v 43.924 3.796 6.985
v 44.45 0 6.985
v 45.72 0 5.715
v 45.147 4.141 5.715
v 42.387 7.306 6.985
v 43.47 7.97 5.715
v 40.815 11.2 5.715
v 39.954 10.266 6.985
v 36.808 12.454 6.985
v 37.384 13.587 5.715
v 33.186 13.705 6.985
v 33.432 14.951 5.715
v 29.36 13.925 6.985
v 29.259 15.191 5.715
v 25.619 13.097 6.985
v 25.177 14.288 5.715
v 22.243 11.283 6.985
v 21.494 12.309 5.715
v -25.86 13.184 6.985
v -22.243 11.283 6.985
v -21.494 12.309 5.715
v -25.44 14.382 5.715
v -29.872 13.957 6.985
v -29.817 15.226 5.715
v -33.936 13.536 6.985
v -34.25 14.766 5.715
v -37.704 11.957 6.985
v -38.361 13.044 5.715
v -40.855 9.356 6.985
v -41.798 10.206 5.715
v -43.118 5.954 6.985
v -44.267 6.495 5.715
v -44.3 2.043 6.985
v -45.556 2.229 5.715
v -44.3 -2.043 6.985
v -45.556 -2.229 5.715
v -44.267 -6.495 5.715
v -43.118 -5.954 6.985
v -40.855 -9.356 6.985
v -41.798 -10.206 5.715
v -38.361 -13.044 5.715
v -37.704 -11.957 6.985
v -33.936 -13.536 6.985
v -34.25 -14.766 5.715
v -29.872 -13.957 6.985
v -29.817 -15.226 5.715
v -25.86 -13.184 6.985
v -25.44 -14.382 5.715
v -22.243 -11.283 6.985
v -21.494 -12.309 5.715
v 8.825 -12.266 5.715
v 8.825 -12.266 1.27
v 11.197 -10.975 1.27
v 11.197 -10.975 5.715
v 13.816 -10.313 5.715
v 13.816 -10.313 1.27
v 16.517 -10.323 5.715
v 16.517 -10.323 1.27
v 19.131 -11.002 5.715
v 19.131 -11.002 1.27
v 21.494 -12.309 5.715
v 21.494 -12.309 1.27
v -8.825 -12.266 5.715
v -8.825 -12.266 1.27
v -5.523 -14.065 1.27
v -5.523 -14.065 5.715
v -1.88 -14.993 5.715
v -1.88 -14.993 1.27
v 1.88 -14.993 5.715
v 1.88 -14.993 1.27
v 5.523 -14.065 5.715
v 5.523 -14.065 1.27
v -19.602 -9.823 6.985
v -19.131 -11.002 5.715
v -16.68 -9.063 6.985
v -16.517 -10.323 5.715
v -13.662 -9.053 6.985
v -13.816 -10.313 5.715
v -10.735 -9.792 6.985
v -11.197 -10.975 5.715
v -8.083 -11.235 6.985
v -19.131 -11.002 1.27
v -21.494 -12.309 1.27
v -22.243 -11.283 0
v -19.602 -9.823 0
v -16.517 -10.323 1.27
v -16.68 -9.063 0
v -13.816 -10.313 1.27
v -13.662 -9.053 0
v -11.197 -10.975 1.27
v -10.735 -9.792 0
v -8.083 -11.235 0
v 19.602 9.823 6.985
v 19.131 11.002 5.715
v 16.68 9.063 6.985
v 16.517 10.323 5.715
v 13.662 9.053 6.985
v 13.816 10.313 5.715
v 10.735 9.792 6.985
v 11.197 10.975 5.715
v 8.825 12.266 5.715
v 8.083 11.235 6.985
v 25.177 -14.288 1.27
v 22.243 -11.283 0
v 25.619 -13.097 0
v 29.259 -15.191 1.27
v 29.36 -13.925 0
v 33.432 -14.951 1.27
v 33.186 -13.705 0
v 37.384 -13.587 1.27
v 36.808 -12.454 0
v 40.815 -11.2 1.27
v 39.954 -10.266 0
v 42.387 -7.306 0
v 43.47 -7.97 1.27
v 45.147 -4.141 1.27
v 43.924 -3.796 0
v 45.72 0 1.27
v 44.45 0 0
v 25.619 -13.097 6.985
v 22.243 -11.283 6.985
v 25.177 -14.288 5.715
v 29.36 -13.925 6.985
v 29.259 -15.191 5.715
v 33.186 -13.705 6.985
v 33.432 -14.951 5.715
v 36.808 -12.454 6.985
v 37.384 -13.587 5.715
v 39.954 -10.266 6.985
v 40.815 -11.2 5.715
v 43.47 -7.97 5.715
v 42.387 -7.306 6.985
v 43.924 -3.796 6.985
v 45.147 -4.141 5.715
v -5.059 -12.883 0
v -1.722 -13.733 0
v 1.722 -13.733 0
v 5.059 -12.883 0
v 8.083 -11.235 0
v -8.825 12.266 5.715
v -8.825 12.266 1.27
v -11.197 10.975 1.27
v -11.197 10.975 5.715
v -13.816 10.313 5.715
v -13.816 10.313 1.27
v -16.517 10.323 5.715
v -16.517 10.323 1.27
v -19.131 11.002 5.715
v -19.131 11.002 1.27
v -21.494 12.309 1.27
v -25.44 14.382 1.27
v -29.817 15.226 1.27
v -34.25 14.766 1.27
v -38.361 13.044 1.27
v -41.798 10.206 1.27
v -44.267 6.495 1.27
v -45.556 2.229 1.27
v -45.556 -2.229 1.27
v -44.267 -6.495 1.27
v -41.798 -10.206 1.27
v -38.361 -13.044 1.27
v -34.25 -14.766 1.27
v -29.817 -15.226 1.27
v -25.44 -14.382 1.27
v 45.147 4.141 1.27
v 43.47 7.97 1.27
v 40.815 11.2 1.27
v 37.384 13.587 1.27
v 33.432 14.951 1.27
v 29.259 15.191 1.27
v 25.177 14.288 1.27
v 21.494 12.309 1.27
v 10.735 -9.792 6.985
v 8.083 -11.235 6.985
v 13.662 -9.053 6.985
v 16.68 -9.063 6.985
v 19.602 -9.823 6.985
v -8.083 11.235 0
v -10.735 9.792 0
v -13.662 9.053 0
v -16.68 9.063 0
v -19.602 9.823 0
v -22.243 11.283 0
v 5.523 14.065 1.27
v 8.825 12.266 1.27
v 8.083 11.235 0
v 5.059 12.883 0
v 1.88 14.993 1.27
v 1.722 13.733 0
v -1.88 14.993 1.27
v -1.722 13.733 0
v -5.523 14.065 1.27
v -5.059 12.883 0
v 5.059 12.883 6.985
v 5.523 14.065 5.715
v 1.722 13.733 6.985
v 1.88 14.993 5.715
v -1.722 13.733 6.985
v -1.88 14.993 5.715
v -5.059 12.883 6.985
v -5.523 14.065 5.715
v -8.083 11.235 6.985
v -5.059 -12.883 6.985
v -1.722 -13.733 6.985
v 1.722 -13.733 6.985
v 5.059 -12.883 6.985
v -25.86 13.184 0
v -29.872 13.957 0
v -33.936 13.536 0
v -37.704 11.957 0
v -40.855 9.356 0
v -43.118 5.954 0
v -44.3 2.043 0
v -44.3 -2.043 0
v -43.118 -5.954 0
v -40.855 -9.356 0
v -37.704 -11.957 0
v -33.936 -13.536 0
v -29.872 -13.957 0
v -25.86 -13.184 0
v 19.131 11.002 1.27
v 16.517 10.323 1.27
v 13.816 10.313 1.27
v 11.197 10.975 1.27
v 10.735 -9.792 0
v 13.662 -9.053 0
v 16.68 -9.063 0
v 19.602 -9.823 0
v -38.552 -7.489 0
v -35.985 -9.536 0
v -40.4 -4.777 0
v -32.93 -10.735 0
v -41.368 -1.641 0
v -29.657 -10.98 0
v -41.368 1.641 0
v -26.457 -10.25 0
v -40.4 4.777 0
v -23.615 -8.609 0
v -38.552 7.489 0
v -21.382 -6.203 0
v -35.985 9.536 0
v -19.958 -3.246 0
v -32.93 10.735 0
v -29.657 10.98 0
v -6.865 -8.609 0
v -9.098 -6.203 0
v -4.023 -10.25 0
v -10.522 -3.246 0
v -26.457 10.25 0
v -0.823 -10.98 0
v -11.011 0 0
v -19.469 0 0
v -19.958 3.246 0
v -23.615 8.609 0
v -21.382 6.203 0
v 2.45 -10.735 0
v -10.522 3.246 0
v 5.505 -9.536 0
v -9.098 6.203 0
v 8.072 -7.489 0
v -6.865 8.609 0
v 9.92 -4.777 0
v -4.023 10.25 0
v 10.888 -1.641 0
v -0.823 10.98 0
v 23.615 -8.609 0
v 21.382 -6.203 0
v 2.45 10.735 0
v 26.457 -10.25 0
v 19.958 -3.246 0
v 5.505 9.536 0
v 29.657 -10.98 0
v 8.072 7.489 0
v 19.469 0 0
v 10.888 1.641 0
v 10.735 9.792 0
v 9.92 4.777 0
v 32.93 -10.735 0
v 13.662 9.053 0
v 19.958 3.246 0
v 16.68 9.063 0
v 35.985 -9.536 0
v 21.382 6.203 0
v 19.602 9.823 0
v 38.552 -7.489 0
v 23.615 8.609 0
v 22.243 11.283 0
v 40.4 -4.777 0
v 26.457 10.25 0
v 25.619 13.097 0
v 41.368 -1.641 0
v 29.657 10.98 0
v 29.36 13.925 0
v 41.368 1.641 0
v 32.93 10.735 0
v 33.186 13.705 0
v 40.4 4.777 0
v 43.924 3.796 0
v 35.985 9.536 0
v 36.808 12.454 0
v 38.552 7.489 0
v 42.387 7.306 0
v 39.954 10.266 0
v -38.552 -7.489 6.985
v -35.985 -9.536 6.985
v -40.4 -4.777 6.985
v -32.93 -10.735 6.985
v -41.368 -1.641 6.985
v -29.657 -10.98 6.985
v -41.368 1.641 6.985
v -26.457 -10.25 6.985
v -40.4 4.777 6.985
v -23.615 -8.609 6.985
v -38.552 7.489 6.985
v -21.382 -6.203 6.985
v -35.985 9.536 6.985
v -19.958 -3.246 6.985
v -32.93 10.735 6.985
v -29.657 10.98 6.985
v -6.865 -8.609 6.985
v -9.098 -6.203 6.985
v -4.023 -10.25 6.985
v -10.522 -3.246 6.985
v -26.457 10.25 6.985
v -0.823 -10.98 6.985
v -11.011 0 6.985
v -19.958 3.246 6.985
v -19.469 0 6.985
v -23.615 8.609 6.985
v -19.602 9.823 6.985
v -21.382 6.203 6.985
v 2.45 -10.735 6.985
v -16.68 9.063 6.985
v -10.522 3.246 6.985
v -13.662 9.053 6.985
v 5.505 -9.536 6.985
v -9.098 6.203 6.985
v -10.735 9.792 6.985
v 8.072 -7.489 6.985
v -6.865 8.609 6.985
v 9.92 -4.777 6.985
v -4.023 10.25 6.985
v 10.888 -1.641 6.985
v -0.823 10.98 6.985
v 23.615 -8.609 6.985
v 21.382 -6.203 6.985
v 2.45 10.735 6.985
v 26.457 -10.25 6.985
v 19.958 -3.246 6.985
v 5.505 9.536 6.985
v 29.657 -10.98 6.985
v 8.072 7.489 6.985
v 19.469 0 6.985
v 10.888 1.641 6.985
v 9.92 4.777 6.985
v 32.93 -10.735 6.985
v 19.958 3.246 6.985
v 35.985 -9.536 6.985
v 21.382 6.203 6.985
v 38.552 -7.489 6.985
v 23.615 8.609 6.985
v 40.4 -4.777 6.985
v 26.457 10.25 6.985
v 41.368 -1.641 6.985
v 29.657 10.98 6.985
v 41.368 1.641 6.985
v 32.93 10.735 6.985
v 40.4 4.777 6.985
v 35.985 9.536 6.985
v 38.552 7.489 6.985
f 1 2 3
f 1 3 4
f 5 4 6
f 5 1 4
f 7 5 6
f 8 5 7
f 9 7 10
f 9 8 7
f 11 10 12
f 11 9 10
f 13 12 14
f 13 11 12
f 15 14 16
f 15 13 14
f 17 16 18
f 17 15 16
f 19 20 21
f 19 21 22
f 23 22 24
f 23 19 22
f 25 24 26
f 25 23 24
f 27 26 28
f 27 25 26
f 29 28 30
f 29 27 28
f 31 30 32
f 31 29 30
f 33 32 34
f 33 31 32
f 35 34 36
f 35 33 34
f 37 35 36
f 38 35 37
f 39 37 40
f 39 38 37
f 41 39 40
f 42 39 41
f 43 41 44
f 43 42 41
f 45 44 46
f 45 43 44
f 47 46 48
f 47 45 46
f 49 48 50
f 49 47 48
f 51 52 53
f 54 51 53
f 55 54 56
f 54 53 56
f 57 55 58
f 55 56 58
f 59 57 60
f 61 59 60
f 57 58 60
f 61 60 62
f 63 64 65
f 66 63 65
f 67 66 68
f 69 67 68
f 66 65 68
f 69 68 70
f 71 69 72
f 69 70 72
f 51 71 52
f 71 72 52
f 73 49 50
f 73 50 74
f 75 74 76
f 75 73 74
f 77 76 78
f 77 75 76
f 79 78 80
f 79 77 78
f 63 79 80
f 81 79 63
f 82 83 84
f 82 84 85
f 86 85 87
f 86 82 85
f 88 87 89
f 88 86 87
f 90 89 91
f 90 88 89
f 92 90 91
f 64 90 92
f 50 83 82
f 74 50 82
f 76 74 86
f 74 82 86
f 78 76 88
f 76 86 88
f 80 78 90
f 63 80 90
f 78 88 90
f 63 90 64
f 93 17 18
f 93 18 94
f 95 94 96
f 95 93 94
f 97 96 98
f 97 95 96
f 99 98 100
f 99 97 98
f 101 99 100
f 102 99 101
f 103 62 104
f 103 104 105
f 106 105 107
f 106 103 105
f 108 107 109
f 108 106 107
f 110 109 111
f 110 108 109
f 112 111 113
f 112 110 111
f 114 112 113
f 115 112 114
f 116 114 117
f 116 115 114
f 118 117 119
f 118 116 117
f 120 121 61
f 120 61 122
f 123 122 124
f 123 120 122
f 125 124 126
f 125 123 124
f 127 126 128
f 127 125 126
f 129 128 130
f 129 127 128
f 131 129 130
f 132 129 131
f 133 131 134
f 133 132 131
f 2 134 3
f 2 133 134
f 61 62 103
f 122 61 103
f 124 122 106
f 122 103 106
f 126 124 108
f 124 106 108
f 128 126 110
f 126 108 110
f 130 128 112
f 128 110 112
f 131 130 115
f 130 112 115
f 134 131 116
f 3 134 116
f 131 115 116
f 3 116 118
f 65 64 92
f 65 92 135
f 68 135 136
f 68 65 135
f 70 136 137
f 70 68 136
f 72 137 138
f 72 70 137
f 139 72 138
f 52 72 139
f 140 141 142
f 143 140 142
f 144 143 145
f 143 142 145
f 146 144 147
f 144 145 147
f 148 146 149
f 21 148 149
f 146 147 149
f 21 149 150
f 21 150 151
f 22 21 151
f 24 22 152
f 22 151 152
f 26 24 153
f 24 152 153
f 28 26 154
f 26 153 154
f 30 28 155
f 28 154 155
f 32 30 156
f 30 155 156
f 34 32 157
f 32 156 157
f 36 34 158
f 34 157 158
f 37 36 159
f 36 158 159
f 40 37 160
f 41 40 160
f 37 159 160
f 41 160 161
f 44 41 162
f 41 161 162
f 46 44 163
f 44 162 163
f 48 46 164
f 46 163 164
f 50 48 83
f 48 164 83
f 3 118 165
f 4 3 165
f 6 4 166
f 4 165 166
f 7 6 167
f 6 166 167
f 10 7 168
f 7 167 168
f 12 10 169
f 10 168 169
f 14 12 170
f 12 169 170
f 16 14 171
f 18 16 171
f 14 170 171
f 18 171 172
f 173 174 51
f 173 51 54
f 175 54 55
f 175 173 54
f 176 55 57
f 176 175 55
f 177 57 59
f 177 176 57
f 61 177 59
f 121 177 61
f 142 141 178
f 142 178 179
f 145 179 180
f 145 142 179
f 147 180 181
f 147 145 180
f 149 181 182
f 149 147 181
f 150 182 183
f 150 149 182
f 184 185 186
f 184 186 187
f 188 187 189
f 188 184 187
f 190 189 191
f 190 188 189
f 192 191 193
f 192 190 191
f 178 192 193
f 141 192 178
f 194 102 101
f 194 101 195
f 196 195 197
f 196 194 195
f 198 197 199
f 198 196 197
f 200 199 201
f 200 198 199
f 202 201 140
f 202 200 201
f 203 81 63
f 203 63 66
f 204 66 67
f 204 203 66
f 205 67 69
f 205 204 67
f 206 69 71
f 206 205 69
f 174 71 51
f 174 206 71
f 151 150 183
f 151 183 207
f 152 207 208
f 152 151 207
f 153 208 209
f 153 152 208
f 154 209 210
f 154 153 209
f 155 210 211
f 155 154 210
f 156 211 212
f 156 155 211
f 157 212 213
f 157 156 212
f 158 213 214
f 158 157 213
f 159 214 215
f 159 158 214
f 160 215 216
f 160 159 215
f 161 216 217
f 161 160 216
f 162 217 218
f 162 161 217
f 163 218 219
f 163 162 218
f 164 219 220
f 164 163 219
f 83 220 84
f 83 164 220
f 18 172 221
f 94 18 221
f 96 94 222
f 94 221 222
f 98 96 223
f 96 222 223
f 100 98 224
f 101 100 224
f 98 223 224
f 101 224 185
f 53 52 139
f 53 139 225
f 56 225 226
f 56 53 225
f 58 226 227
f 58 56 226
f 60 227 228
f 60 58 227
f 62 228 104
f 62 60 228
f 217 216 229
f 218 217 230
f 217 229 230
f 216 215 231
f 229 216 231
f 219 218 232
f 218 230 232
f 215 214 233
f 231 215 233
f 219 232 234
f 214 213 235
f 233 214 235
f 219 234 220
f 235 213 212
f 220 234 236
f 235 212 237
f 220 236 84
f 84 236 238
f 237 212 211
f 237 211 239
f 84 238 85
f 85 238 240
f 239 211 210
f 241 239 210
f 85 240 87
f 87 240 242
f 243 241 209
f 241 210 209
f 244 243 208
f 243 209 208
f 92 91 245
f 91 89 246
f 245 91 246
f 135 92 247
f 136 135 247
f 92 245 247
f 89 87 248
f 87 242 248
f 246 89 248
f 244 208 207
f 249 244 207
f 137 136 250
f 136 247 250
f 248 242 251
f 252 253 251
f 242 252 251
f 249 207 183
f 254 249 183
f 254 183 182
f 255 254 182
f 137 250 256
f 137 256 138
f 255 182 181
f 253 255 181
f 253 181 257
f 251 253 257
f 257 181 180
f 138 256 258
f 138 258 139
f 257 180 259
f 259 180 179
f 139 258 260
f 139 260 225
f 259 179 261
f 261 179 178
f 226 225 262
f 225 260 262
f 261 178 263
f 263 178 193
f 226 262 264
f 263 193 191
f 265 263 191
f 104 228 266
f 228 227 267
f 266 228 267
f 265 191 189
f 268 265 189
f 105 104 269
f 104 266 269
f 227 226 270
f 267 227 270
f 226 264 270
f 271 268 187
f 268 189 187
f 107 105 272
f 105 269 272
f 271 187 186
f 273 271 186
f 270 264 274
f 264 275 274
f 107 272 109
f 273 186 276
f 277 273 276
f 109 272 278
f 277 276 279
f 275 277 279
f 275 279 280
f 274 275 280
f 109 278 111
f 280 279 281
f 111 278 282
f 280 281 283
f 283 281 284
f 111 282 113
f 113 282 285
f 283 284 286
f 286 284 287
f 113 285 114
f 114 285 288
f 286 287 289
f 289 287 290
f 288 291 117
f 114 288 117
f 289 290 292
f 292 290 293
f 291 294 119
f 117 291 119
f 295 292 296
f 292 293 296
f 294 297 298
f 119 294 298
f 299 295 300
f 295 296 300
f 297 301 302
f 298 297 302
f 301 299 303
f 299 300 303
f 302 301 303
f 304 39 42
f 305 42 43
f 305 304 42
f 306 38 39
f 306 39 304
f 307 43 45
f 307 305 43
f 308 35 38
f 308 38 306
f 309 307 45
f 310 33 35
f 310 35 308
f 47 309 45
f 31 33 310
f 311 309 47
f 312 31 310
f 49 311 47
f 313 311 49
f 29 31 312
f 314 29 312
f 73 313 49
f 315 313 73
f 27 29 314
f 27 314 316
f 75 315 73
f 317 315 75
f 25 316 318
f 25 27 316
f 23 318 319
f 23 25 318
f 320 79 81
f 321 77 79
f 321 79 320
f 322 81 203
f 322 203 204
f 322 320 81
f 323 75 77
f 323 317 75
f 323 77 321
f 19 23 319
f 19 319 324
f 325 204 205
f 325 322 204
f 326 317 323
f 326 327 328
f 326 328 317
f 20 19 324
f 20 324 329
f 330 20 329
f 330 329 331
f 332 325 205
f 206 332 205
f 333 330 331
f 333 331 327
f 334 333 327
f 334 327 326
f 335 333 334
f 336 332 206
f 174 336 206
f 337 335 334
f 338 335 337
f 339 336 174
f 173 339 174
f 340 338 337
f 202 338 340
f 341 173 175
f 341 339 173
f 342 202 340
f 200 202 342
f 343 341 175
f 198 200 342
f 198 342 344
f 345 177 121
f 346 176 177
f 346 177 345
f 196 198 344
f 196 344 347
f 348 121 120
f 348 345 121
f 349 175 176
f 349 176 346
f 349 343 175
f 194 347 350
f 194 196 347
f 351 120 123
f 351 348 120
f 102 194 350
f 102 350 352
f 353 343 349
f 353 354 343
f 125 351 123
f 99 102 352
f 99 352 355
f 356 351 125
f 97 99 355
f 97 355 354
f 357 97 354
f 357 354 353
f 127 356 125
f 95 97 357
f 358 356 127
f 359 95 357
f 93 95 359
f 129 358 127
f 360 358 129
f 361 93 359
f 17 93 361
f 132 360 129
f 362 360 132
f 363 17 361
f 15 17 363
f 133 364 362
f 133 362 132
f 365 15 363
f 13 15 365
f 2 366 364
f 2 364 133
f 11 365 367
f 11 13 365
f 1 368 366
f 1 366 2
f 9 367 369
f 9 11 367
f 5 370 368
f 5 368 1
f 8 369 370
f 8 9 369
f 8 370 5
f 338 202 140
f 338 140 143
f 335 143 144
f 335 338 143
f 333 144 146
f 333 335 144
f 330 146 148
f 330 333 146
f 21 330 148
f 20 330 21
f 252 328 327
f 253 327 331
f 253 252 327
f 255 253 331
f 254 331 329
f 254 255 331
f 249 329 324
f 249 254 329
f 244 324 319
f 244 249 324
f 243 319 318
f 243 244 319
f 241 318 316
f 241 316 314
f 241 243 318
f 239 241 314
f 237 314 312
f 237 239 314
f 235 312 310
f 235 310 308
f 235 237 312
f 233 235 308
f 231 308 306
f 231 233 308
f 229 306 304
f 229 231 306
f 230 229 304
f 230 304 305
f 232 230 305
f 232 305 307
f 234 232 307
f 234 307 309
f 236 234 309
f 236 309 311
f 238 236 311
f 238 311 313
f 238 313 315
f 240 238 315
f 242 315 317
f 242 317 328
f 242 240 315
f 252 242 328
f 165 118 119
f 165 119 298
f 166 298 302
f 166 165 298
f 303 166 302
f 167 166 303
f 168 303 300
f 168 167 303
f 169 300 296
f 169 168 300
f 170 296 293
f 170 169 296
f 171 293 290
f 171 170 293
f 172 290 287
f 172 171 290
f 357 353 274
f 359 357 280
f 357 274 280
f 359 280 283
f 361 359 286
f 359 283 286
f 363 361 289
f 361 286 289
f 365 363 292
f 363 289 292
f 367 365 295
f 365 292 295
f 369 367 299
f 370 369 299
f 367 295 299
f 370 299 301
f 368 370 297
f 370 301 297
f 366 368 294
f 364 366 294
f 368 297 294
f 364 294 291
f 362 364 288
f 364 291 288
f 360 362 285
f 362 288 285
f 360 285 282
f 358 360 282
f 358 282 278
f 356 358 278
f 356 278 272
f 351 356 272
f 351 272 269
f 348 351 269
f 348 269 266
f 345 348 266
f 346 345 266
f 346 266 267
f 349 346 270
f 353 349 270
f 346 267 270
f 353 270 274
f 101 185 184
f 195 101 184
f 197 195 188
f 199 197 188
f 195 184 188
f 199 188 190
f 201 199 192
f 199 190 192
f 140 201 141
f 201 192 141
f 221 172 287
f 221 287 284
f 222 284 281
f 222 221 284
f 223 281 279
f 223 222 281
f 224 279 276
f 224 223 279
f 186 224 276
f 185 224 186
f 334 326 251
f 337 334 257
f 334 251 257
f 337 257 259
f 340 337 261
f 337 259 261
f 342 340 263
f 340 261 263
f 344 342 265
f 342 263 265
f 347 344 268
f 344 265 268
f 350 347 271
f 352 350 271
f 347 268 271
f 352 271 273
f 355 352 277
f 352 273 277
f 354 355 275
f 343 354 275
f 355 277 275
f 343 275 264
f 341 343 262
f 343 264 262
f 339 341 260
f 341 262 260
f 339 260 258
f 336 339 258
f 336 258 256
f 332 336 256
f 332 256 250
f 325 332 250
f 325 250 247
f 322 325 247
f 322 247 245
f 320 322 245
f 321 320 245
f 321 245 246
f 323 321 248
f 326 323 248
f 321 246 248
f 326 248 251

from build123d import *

# Parameters (mm, degrees)
F0_R     = 11.0109
F1_DEPTH = 6.985
F2_SIZE  = 1.27
F3_SIZE  = 1.27


with BuildPart() as f1:
    # F0 (on Top) → F1 (new body)
    with BuildSketch(Plane.XY):
        with BuildLine():
            Line((15.1104870251, 0), (11.0109, 0))
            ThreePointArc((11.0109, 0), (0, -11.0109), (-11.0109, 0))
            Line((-11.0109, 0), (-15.1104870251, 0))
            ThreePointArc((-15.1104870251, 0), (-13.4476229912, -6.8911721805), (-8.8250173454, -12.2656384664))
            ThreePointArc((-8.8250173454, -12.2656384664), (0, -15.1104870251), (8.8250173454, -12.2656384664))
            ThreePointArc((8.8250173454, -12.2656384664), (13.4476229912, -6.8911721805), (15.1104870251, 0))
        make_face()
        with BuildLine():
            ThreePointArc((-11.0109, 0), (0, 11.0109), (11.0109, 0))
            Line((11.0109, 0), (15.1104870251, 0))
            ThreePointArc((15.1104870251, 0), (13.4476229912, 6.8911721805), (8.8250173454, 12.2656384664))
            ThreePointArc((8.8250173454, 12.2656384664), (0, 15.1104870251), (-8.8250173454, 12.2656384664))
            ThreePointArc((-8.8250173454, 12.2656384664), (-13.4476229912, 6.8911721805), (-15.1104870251, 0))
            Line((-15.1104870251, 0), (-11.0109, 0))
        make_face()
        with BuildLine():
            ThreePointArc((8.8250173454, 12.2656384664), (13.4476229912, 6.8911721805), (15.1104870251, 0))
            Line((15.1104870251, 0), (15.24, 0))
            ThreePointArc((15.24, 0), (16.8932840155, 6.9035316148), (21.4944289707, 12.3092287848))
            ThreePointArc((21.4944289707, 12.3092287848), (15.1667904983, 10.2333297341), (8.8250173454, 12.2656384664))
        make_face()
        with BuildLine():
            Line((15.24, 0), (15.1104870251, 0))
            ThreePointArc((15.1104870251, 0), (13.4476229912, -6.8911721805), (8.8250173454, -12.2656384664))
            ThreePointArc((8.8250173454, -12.2656384664), (15.1667904983, -10.2333297341), (21.4944289707, -12.3092287848))
            ThreePointArc((21.4944289707, -12.3092287848), (16.8932840155, -6.9035316148), (15.24, 0))
        make_face()
        with BuildLine():
            ThreePointArc((-8.8250173454, -12.2656384664), (-13.4476229912, -6.8911721805), (-15.1104870251, 0))
            Line((-15.1104870251, 0), (-15.24, 0))
            ThreePointArc((-15.24, 0), (-16.8932840155, -6.9035316148), (-21.4944289707, -12.3092287848))
            ThreePointArc((-21.4944289707, -12.3092287848), (-15.1667904983, -10.2333297341), (-8.8250173454, -12.2656384664))
        make_face()
        with BuildLine():
            Line((-15.24, 0), (-15.1104870251, 0))
            ThreePointArc((-15.1104870251, 0), (-13.4476229912, 6.8911721805), (-8.8250173454, 12.2656384664))
            ThreePointArc((-8.8250173454, 12.2656384664), (-15.1667904983, 10.2333297341), (-21.4944289707, 12.3092287848))
            ThreePointArc((-21.4944289707, 12.3092287848), (-16.8932840155, 6.9035316148), (-15.24, 0))
        make_face()
        with BuildLine():
            ThreePointArc((21.4944289707, 12.3092287848), (16.8932840155, 6.9035316148), (15.24, 0))
            ThreePointArc((15.24, 0), (16.8932840155, -6.9035316148), (21.4944289707, -12.3092287848))
            ThreePointArc((21.4944289707, -12.3092287848), (37.3835316148, -13.5867159845), (45.72, 0))
            ThreePointArc((45.72, 0), (37.3835316148, 13.5867159845), (21.4944289707, 12.3092287848))
        make_face()
        with BuildLine():
            ThreePointArc((41.4909, 0), (30.48, -11.0109), (19.4691, 0))
            ThreePointArc((19.4691, 0), (30.48, 11.0109), (41.4909, 0))
        make_face(mode=Mode.SUBTRACT)
        with BuildLine():
            ThreePointArc((-21.4944289707, -12.3092287848), (-16.8932840155, -6.9035316148), (-15.24, 0))
            ThreePointArc((-15.24, 0), (-16.8932840155, 6.9035316148), (-21.4944289707, 12.3092287848))
            ThreePointArc((-21.4944289707, 12.3092287848), (-45.72, 0), (-21.4944289707, -12.3092287848))
        make_face()
        with Locations((-30.48, 0)):
            Circle(F0_R, mode=Mode.SUBTRACT)
    extrude(amount=F1_DEPTH)

    # F2
    f2_edges = [f1.edges().sort_by_distance(p)[0] for p in [
        (-45.72, 0, 6.985),
    ]]
    chamfer(f2_edges, length=F2_SIZE)

    # F3
    f3_edges = [f1.edges().sort_by_distance(p)[0] for p in [
        (-45.72, 0, 0),
        (45.72, 0, 0),
        (0, -15.110487, 0),
        (15.16679, -10.23333, 0),
        (-15.16679, -10.23333, 0),
        (-15.16679, 10.23333, 0),
        (0, 15.110487, 0),
        (15.16679, 10.23333, 0),
    ]]
    chamfer(f3_edges, length=F3_SIZE)


solid = f1.part
